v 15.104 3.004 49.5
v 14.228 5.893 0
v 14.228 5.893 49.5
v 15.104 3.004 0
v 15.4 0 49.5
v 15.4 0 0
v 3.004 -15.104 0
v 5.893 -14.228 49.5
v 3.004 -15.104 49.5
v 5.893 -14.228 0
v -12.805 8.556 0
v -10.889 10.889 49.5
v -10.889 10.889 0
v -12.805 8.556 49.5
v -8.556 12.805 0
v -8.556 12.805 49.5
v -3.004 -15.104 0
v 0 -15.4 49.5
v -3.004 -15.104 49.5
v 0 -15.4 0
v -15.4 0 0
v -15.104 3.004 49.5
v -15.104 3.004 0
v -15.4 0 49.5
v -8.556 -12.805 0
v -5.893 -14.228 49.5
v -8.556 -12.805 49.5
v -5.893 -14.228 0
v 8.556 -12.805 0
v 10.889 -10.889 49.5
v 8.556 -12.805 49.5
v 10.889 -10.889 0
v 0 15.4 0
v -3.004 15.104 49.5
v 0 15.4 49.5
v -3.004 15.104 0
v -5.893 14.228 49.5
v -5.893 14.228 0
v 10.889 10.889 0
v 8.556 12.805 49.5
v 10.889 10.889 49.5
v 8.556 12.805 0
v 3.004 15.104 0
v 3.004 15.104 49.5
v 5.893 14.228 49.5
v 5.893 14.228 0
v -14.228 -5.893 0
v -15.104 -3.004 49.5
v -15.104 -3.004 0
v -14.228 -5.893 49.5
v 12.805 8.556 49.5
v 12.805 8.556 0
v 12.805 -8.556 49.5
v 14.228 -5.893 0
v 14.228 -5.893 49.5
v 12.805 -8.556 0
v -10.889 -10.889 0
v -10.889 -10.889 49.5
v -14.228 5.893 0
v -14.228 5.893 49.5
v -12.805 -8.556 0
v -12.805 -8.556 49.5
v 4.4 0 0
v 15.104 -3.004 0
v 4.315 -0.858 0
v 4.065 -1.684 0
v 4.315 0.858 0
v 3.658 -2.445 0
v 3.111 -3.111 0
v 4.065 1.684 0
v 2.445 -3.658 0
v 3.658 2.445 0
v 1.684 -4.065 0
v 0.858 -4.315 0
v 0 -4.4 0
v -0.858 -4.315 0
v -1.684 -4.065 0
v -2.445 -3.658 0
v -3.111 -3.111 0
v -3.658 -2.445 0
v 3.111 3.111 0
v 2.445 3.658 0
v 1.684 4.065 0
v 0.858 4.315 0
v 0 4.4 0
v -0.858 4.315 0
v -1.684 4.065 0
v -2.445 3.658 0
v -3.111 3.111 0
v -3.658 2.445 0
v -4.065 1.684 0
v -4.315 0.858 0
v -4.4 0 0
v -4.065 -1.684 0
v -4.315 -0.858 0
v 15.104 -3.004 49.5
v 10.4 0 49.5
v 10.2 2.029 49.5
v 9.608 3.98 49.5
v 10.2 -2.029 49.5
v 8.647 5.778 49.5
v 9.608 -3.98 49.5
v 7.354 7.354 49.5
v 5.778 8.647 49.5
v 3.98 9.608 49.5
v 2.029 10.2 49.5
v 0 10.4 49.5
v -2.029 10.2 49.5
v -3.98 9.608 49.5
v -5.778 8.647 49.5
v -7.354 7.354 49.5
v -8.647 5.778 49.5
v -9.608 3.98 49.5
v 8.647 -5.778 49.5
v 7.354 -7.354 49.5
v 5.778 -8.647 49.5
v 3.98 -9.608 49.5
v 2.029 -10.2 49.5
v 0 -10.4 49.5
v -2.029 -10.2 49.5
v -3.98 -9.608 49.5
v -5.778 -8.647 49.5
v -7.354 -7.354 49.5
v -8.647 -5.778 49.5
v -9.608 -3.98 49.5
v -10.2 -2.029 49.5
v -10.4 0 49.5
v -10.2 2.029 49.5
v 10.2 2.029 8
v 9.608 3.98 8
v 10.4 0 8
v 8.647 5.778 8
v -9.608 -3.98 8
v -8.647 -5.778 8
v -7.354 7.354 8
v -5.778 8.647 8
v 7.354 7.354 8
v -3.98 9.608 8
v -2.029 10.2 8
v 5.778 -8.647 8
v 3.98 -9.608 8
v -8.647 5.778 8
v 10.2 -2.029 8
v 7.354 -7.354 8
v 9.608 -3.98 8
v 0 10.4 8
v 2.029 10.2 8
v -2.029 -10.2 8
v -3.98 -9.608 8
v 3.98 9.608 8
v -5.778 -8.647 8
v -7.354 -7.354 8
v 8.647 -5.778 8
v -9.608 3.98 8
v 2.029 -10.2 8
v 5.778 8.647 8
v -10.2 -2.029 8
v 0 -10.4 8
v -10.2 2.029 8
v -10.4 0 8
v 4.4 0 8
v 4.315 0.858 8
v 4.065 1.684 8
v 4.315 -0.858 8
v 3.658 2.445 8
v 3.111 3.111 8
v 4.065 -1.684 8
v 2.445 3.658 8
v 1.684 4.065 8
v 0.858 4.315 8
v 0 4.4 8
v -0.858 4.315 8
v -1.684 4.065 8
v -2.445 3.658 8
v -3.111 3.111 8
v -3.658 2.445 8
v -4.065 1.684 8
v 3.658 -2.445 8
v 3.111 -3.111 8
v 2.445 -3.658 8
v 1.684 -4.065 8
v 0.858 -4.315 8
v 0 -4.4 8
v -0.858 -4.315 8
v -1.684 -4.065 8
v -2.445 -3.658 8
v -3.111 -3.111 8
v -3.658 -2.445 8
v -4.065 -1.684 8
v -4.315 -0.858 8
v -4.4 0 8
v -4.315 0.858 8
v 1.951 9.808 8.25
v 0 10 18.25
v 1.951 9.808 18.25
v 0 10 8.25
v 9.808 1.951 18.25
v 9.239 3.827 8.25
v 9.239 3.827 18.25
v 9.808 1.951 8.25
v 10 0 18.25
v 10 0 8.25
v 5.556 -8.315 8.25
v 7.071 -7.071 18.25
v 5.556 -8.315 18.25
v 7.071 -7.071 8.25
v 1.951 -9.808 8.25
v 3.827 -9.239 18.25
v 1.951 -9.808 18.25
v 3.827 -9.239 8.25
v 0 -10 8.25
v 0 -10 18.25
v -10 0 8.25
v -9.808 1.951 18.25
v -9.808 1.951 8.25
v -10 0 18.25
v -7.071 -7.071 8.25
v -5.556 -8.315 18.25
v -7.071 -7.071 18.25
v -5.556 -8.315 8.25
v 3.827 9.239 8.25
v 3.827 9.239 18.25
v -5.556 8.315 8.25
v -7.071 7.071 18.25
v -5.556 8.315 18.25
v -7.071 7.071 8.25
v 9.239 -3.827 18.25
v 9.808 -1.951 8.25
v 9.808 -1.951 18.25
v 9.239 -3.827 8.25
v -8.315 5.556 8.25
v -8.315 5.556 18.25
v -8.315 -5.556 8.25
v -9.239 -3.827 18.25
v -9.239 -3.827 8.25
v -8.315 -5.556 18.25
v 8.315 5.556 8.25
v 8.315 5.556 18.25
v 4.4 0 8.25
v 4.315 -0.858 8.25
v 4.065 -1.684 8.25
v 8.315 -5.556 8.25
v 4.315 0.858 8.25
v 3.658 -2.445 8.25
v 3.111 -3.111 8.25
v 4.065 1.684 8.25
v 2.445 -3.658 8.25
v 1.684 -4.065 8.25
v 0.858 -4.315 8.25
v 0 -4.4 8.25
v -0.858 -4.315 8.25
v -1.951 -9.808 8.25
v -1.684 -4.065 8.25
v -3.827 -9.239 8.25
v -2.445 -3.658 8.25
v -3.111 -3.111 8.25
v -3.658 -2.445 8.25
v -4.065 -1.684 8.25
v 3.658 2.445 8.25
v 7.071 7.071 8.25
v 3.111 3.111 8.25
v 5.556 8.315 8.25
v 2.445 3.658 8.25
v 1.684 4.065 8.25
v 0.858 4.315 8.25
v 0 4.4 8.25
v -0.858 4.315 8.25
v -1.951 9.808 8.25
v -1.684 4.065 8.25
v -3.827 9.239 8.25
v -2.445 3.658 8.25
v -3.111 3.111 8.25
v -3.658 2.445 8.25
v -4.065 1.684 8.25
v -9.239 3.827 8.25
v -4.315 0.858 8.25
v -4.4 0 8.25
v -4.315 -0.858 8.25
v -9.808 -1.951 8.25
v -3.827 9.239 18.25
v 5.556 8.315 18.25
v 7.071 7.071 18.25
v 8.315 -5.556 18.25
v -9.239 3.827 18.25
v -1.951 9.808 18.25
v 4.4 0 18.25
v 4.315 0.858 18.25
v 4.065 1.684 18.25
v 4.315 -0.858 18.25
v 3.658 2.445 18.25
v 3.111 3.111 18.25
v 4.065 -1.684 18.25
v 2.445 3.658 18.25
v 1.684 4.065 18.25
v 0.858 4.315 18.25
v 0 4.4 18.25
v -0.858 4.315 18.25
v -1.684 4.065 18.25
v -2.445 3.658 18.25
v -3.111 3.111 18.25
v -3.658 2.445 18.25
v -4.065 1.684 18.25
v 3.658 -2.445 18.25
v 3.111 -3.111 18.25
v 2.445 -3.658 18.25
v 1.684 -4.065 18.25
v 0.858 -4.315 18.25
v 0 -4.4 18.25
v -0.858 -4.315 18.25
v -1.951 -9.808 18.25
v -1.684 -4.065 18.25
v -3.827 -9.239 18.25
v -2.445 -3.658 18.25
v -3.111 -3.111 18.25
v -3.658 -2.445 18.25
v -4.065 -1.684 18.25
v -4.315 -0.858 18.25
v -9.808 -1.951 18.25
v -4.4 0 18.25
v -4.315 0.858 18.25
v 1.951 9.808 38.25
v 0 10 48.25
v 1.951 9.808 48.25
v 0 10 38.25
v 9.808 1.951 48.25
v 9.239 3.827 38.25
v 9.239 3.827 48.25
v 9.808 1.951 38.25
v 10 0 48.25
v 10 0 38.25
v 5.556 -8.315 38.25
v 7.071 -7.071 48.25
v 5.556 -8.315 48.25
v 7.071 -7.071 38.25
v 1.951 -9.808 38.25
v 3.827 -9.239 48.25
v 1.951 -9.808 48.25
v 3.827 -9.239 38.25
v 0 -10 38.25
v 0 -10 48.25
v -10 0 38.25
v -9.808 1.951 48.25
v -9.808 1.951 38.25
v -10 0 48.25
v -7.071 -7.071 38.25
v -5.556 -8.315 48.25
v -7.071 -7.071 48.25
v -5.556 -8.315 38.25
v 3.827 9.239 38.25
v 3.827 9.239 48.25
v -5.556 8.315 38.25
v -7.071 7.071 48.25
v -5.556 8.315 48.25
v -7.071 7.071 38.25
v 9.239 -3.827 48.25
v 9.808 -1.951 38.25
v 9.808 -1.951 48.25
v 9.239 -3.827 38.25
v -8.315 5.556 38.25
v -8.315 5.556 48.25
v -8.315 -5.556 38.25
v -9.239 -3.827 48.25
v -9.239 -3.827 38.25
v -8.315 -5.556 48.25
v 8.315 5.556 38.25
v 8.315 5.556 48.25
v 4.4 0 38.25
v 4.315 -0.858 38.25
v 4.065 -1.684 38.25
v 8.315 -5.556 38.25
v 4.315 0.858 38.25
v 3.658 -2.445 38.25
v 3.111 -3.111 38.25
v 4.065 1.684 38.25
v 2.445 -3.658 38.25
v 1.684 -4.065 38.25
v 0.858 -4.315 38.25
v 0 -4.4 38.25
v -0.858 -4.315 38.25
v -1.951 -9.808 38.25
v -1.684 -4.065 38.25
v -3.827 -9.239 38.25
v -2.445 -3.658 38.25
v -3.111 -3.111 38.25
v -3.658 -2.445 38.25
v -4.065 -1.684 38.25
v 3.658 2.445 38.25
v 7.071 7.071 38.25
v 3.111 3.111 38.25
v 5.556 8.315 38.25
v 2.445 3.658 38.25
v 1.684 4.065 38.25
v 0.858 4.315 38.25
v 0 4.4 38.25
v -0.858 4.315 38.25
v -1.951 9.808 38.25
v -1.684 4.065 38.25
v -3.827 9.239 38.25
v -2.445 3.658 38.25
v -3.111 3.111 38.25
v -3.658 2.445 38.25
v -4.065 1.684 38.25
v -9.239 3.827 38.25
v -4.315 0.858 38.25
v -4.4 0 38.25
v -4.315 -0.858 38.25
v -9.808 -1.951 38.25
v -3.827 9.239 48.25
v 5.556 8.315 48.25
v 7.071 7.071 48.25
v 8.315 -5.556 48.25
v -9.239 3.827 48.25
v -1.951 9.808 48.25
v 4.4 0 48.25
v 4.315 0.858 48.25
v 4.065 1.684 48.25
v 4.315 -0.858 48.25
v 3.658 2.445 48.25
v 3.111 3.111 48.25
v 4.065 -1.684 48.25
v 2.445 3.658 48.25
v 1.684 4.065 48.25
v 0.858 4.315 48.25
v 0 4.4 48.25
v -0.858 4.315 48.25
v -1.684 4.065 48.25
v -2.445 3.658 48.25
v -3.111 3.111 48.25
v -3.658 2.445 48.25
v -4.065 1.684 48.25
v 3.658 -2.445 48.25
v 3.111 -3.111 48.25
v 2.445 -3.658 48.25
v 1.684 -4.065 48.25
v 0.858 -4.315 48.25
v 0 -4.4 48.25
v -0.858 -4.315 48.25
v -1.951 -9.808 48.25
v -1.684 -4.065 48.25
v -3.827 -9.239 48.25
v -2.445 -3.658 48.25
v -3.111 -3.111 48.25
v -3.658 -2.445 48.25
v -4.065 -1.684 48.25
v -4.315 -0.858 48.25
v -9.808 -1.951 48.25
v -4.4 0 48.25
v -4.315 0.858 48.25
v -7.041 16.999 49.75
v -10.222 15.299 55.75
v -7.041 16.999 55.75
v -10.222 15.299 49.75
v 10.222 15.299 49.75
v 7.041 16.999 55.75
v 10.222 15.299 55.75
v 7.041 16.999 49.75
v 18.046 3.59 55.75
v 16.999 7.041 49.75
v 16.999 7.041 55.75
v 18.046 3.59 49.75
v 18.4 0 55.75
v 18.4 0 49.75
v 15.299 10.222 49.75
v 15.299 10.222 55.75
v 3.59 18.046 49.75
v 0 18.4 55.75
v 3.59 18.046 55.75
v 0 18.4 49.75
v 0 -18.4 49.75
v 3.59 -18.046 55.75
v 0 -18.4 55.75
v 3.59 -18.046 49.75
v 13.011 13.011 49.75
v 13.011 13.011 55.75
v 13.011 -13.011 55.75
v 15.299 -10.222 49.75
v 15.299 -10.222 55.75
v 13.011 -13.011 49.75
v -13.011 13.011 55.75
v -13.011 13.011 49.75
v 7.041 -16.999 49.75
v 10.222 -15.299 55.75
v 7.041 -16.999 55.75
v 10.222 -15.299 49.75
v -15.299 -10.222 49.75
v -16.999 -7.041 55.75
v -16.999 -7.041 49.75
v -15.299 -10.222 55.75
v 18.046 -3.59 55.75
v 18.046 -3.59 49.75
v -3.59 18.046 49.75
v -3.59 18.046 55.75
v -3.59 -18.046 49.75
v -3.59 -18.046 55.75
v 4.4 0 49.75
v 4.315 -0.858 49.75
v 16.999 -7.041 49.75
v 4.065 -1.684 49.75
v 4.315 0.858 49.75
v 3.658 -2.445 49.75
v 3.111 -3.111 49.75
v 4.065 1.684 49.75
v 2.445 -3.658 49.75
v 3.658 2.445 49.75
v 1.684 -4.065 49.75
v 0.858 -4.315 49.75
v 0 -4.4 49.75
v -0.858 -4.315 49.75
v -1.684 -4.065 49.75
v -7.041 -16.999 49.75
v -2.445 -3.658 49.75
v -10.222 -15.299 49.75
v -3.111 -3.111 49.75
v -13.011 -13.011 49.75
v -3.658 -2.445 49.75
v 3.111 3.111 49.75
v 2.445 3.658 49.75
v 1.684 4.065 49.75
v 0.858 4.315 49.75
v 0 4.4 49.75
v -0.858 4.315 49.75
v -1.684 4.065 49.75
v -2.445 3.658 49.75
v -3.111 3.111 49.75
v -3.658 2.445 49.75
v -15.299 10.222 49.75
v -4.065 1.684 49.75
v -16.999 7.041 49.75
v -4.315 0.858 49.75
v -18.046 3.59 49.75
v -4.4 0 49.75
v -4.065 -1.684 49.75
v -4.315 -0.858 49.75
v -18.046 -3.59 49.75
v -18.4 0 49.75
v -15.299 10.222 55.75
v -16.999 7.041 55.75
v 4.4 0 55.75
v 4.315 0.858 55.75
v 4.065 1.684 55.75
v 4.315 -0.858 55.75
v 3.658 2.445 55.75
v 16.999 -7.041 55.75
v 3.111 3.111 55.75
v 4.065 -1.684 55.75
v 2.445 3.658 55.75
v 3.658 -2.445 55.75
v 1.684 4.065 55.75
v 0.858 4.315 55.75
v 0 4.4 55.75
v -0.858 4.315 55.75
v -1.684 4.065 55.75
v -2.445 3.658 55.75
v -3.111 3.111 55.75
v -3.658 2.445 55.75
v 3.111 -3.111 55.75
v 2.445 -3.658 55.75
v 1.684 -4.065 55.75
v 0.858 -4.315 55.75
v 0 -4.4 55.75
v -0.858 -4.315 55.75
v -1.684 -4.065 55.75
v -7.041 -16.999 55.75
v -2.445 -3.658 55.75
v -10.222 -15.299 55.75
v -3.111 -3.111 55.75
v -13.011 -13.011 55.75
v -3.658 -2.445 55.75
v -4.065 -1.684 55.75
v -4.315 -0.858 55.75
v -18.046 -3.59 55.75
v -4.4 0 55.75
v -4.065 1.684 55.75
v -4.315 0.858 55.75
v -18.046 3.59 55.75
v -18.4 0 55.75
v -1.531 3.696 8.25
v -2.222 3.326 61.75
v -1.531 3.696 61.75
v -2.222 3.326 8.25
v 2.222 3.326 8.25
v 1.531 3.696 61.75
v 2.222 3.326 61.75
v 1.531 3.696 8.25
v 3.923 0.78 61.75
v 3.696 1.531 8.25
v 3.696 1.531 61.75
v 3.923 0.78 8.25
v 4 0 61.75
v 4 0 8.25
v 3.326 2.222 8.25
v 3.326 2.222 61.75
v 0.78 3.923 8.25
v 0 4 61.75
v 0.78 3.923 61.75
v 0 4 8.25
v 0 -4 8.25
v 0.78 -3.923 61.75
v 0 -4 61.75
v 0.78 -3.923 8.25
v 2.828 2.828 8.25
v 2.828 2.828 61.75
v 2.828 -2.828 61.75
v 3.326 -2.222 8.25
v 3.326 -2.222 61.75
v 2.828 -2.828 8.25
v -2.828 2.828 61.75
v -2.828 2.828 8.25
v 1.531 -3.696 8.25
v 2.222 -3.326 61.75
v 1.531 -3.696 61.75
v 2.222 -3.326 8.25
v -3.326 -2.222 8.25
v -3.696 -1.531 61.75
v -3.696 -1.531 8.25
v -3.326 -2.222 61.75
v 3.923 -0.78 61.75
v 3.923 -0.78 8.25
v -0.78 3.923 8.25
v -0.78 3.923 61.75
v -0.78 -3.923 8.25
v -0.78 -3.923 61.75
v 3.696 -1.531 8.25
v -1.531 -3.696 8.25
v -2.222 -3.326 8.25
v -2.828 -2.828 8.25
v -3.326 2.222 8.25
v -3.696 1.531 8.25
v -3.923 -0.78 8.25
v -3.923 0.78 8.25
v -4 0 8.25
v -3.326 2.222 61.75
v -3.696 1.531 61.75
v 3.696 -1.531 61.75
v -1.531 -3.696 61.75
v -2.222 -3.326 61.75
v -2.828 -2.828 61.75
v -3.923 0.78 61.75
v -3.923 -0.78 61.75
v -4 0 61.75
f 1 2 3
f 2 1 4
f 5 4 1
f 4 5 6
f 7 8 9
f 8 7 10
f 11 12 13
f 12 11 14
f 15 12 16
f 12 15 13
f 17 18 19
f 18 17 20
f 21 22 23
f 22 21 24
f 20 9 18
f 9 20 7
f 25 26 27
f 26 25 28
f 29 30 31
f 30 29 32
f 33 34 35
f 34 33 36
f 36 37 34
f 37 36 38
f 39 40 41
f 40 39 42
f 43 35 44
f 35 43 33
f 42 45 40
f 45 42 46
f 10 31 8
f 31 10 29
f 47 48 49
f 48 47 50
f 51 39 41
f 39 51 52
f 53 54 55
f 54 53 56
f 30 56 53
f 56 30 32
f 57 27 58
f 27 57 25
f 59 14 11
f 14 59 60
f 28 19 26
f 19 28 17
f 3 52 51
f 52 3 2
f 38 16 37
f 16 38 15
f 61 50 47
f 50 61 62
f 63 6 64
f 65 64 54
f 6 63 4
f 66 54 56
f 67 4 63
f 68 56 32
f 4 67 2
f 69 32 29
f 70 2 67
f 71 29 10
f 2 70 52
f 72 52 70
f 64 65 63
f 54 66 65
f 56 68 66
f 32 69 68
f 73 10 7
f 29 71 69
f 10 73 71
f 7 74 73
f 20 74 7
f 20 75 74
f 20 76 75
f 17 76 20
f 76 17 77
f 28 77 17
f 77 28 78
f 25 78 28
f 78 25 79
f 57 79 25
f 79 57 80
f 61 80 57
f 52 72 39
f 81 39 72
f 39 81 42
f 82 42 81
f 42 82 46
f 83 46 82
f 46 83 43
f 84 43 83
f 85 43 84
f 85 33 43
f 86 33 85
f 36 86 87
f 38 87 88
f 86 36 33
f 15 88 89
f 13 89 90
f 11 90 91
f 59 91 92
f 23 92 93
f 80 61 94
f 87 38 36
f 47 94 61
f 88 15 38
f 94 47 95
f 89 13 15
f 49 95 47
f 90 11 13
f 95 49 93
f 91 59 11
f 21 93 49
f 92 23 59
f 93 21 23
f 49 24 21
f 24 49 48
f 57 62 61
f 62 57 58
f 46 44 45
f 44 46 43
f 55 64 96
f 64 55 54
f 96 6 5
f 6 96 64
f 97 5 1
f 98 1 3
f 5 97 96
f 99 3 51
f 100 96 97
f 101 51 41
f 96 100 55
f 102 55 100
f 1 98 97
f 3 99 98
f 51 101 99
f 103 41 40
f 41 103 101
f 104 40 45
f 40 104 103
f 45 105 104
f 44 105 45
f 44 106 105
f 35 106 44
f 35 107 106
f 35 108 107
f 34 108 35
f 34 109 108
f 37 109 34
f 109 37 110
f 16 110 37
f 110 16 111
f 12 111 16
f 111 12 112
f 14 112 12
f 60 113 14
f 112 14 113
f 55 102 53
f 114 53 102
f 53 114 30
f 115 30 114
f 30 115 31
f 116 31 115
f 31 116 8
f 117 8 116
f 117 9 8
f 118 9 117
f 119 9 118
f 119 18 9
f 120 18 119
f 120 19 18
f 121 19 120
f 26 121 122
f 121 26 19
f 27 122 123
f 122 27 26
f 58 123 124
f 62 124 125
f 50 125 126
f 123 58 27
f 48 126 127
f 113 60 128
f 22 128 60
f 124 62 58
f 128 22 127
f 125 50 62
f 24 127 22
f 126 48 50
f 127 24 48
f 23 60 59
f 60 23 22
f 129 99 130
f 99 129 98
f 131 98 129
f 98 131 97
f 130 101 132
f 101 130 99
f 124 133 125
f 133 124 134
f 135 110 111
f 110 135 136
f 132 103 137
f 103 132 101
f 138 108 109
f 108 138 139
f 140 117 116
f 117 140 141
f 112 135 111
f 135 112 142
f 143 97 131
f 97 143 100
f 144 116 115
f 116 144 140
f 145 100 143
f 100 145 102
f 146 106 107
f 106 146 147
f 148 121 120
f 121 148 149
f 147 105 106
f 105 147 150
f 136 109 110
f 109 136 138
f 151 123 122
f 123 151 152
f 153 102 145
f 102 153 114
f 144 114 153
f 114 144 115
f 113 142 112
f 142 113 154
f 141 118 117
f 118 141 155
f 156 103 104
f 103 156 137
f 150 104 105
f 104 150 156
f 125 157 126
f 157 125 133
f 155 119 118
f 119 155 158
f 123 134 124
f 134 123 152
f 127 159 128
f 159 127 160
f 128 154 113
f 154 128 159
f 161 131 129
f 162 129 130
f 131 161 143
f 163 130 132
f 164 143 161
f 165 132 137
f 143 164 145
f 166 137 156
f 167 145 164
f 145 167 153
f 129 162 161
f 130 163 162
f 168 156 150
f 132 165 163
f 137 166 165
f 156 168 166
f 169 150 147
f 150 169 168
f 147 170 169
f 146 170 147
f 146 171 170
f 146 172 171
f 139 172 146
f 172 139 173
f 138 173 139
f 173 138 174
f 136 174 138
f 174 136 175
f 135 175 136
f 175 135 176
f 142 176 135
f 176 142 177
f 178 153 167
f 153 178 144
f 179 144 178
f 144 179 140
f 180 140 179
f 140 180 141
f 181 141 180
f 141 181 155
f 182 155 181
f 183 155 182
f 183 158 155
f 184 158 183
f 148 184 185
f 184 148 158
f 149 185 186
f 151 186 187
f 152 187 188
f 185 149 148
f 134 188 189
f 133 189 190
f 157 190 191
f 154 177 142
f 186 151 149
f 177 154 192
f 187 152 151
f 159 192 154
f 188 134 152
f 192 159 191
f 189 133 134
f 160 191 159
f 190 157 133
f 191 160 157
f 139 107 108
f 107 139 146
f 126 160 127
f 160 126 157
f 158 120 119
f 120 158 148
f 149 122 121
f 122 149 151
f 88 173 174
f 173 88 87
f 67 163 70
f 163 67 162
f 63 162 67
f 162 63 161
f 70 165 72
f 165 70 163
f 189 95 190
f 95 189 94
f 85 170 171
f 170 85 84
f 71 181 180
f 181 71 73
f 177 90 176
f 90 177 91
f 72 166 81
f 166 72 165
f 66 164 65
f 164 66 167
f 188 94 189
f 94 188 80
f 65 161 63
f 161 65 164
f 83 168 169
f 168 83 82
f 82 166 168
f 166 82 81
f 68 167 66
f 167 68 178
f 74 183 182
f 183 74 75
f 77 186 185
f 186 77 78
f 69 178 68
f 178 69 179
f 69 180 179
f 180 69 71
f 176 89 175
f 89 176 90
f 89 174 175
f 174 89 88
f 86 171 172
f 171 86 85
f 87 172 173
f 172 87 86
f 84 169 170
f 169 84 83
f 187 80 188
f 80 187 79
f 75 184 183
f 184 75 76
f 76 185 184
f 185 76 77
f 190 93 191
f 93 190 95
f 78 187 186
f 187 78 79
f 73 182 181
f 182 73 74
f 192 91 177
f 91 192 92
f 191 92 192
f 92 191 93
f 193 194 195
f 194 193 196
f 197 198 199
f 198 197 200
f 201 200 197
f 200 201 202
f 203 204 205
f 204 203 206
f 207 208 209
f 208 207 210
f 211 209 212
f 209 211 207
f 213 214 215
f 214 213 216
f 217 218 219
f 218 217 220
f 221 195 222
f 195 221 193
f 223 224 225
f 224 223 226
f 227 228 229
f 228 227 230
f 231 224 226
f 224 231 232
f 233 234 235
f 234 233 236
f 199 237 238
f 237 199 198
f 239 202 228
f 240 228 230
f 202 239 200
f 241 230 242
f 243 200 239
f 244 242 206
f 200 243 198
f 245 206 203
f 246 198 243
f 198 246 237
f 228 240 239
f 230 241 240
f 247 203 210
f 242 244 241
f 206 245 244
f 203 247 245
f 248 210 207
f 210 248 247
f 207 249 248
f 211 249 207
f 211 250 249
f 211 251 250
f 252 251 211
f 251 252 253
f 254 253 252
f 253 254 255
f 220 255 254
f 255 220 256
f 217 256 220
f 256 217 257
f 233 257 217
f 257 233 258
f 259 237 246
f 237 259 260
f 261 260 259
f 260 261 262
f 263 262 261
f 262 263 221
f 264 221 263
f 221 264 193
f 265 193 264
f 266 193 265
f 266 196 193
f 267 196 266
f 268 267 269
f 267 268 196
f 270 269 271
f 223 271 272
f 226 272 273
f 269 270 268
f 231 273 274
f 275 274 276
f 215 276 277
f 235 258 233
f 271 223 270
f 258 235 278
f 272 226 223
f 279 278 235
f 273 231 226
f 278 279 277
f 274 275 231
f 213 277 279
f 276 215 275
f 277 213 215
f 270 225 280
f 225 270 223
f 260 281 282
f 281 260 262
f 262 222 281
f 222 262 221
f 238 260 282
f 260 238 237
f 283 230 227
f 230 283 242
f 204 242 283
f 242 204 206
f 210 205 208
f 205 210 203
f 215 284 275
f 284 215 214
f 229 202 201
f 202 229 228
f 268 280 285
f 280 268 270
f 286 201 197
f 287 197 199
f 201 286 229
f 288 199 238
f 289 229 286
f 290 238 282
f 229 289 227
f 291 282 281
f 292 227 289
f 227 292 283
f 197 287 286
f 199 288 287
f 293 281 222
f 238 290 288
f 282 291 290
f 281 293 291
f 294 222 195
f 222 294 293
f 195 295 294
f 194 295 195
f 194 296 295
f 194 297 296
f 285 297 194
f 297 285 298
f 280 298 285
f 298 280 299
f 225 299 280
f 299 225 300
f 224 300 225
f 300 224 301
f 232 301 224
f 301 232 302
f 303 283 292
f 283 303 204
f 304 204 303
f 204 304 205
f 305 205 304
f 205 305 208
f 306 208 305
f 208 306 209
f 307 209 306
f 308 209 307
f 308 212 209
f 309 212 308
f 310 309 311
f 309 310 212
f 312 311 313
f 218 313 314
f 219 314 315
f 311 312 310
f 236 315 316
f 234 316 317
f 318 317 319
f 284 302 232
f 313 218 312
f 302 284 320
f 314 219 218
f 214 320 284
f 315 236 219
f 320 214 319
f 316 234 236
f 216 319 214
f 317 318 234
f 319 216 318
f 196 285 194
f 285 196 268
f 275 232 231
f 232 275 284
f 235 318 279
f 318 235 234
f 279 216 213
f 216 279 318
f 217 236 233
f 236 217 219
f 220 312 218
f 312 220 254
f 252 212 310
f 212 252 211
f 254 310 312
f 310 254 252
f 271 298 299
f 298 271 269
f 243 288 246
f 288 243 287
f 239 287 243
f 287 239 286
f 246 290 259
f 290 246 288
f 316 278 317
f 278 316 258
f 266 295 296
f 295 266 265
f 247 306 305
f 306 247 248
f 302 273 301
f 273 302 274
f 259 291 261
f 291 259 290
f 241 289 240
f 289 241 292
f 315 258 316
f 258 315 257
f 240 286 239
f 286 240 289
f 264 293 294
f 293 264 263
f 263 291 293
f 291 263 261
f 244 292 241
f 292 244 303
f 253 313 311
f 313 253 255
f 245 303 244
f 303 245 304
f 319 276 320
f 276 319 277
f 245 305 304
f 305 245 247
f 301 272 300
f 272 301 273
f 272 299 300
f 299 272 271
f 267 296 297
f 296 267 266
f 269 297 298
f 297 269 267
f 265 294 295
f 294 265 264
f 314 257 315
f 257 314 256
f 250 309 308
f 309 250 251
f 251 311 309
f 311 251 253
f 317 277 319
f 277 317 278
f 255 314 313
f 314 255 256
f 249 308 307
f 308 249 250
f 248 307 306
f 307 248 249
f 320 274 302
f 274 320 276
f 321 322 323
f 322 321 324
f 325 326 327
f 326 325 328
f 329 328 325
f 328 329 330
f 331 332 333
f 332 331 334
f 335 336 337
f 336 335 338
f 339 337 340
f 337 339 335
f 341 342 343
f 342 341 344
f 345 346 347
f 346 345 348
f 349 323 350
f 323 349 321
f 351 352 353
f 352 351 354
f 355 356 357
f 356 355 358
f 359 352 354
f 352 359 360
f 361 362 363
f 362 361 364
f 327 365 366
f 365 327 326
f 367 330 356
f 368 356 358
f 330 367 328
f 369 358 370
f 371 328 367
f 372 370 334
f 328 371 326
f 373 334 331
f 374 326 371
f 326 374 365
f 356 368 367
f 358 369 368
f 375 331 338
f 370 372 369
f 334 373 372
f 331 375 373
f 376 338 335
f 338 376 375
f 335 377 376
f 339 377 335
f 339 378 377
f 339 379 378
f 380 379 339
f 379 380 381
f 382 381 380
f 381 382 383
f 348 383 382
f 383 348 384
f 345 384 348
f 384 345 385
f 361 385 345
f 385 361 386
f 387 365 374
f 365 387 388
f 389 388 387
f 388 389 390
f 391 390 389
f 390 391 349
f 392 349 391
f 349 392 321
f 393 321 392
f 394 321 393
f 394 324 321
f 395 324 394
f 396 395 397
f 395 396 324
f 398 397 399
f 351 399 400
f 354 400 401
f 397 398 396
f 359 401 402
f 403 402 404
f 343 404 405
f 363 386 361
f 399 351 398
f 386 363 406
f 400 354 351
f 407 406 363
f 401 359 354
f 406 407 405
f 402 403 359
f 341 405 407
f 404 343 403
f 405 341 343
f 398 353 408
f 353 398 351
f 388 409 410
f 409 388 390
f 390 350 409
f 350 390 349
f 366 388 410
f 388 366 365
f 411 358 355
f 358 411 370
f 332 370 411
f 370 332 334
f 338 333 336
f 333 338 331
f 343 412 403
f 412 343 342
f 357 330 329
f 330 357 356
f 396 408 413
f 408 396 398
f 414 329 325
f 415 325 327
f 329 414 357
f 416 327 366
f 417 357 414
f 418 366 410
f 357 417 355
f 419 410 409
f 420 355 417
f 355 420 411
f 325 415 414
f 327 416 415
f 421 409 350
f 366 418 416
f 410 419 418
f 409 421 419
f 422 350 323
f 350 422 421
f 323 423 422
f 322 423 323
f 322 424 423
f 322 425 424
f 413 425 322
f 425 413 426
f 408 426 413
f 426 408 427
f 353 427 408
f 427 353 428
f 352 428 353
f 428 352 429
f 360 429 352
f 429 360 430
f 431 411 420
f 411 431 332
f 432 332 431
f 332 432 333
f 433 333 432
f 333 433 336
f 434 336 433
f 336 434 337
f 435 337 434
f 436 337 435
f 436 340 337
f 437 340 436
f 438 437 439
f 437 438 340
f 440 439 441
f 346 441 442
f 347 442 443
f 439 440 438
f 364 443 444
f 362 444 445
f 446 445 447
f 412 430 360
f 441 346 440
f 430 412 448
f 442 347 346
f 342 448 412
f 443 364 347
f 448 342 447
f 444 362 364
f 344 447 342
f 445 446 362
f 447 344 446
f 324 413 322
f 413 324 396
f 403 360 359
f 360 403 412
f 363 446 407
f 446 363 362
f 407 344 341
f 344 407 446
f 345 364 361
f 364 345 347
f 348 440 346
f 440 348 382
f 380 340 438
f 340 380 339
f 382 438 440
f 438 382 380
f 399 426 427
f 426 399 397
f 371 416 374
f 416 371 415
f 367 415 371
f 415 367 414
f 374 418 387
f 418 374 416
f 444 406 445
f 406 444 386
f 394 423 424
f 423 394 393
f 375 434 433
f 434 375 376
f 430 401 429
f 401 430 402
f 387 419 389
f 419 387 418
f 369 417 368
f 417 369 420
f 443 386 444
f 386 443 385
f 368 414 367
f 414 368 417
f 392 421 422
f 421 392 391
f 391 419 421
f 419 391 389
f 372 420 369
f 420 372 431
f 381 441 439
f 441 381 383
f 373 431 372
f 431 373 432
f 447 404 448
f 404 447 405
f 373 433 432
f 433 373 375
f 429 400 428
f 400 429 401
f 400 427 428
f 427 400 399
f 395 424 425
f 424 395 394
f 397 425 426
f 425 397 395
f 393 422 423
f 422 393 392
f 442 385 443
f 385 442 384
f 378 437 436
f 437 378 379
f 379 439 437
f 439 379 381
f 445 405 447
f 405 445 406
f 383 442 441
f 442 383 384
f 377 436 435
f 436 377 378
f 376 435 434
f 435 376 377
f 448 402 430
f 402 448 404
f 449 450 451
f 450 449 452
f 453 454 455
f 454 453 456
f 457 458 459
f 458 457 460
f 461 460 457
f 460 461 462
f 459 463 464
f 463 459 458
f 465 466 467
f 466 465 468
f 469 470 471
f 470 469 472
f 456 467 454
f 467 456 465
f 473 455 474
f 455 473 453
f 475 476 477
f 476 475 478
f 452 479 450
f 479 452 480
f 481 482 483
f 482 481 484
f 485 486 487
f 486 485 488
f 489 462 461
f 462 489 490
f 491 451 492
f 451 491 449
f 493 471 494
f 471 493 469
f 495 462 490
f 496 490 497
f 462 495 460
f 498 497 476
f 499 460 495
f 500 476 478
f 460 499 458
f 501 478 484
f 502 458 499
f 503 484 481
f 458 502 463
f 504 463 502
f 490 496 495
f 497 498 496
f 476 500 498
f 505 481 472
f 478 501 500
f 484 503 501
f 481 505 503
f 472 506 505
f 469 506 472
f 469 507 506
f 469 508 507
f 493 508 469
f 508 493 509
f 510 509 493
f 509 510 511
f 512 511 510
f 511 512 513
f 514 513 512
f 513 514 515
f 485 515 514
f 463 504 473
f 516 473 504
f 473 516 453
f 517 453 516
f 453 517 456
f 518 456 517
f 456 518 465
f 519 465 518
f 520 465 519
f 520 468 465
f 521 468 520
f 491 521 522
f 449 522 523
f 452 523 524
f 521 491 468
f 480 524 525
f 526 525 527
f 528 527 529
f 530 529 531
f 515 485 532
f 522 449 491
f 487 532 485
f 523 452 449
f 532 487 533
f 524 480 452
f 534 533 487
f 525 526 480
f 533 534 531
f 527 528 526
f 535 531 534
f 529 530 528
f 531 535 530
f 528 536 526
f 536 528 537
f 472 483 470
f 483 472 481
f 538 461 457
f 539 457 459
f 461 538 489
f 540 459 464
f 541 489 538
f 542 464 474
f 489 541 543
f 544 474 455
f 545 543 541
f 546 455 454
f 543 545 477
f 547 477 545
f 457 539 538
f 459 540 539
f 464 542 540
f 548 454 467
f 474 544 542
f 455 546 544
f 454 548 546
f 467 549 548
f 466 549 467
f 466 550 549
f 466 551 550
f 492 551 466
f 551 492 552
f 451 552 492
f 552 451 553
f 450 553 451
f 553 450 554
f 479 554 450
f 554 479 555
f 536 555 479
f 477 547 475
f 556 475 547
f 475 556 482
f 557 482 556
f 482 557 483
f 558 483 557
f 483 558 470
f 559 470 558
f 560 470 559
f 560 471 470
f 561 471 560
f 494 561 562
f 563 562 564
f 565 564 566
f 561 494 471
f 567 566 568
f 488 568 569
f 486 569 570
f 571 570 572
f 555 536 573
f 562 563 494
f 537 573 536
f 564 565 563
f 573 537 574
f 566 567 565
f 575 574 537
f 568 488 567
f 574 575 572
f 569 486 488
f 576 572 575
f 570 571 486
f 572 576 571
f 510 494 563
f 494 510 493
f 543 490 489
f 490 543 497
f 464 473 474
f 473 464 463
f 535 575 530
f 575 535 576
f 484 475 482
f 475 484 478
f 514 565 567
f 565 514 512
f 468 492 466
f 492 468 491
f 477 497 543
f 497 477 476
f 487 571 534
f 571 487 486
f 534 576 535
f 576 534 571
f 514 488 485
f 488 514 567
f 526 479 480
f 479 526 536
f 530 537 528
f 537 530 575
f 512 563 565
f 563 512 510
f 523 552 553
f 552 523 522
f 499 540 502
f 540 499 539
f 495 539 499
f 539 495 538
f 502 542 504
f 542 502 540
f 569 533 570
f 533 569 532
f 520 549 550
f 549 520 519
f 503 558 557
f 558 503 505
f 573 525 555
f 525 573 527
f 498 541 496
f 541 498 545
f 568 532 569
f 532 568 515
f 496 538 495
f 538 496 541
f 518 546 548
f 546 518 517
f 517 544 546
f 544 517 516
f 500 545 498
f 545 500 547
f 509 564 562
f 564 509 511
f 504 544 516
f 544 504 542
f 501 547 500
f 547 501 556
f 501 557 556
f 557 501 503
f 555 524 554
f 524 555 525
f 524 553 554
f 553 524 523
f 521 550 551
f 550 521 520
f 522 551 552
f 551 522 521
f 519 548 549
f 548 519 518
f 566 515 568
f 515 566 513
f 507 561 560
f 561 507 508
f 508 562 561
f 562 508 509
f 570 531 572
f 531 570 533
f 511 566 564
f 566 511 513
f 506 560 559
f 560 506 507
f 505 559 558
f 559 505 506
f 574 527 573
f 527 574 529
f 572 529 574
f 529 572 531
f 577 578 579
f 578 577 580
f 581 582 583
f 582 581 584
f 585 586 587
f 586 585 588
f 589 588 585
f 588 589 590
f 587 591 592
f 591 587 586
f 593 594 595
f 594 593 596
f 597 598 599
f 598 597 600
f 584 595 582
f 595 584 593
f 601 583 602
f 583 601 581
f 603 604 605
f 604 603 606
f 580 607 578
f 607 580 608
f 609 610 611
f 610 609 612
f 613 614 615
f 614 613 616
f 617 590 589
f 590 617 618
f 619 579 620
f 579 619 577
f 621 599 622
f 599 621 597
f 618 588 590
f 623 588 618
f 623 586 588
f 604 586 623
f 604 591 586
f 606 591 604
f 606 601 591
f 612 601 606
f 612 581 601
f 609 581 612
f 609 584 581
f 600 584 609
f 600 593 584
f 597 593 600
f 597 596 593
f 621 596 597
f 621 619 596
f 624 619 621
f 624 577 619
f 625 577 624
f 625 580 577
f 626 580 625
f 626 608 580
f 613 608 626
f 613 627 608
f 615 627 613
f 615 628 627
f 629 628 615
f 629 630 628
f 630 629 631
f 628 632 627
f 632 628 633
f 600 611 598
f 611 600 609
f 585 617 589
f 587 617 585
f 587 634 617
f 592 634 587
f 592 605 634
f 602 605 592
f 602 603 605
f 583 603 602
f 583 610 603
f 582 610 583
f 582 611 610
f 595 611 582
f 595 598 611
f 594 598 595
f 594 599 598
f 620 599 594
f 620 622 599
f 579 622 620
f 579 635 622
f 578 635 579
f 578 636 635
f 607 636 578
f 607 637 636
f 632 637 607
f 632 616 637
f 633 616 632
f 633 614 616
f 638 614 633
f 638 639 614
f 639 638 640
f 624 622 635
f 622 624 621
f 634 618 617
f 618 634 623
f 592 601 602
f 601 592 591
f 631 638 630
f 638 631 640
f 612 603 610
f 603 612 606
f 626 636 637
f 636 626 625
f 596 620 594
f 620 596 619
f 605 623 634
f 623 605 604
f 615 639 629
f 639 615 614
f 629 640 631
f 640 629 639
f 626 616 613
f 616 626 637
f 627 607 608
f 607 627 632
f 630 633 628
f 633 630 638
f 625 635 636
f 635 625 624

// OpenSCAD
$fn = 32;

// ------------------------------------------------------------------------
// Shaft station: cup d30.8 x 49.5 mm, shaft d8
// Every part is its own module, assembly() places every instance.
// ------------------------------------------------------------------------

// --- part 1 ---
module housing_cup() {
  difference() {
    cylinder(h = 49.5, d = 30.8);
    translate([0, 0, 8]) cylinder(h = 42.5, d = 20.8);
    translate([0, 0, -1]) cylinder(h = 10, d = 8.8);
  }
}

// --- part 2 ---
module bearing_lower() {
  difference() {
      translate([0, 0, 0]) cylinder(h = 10, d = 20);
      translate([0, 0, -1]) cylinder(h = 12, d = 8.8);
    }
}

// --- part 3 ---
module bearing_upper() {
  difference() {
      translate([0, 0, 0]) cylinder(h = 10, d = 20);
      translate([0, 0, -1]) cylinder(h = 12, d = 8.8);
    }
}

// --- part 4 ---
module station_shaft() {
  translate([0, 0, -26.75]) cylinder(h = 53.5, d = 8);
}

// --- part 5 ---
module station_cover() {
  difference() {
    cylinder(h = 6, d = 36.8);
    translate([0, 0, -1]) cylinder(h = 8, d = 8.8);
  }
}

// --- assembly ---
module assembly() {
  color([0.80, 0.24, 0.20]) translate([0, 0, 0]) rotate([0, 0, 0]) housing_cup();
  color([0.20, 0.45, 0.75]) translate([0, 0, 8.25]) rotate([0, 0, 0]) bearing_lower();
  color([0.25, 0.62, 0.32]) translate([0, 0, 38.25]) rotate([0, 0, 0]) bearing_upper();
  color([0.92, 0.70, 0.18]) translate([0, 0, 35]) rotate([0, 0, 0]) station_shaft();
  color([0.58, 0.35, 0.70]) translate([0, 0, 49.75]) rotate([0, 0, 0]) station_cover();
}

assembly();
